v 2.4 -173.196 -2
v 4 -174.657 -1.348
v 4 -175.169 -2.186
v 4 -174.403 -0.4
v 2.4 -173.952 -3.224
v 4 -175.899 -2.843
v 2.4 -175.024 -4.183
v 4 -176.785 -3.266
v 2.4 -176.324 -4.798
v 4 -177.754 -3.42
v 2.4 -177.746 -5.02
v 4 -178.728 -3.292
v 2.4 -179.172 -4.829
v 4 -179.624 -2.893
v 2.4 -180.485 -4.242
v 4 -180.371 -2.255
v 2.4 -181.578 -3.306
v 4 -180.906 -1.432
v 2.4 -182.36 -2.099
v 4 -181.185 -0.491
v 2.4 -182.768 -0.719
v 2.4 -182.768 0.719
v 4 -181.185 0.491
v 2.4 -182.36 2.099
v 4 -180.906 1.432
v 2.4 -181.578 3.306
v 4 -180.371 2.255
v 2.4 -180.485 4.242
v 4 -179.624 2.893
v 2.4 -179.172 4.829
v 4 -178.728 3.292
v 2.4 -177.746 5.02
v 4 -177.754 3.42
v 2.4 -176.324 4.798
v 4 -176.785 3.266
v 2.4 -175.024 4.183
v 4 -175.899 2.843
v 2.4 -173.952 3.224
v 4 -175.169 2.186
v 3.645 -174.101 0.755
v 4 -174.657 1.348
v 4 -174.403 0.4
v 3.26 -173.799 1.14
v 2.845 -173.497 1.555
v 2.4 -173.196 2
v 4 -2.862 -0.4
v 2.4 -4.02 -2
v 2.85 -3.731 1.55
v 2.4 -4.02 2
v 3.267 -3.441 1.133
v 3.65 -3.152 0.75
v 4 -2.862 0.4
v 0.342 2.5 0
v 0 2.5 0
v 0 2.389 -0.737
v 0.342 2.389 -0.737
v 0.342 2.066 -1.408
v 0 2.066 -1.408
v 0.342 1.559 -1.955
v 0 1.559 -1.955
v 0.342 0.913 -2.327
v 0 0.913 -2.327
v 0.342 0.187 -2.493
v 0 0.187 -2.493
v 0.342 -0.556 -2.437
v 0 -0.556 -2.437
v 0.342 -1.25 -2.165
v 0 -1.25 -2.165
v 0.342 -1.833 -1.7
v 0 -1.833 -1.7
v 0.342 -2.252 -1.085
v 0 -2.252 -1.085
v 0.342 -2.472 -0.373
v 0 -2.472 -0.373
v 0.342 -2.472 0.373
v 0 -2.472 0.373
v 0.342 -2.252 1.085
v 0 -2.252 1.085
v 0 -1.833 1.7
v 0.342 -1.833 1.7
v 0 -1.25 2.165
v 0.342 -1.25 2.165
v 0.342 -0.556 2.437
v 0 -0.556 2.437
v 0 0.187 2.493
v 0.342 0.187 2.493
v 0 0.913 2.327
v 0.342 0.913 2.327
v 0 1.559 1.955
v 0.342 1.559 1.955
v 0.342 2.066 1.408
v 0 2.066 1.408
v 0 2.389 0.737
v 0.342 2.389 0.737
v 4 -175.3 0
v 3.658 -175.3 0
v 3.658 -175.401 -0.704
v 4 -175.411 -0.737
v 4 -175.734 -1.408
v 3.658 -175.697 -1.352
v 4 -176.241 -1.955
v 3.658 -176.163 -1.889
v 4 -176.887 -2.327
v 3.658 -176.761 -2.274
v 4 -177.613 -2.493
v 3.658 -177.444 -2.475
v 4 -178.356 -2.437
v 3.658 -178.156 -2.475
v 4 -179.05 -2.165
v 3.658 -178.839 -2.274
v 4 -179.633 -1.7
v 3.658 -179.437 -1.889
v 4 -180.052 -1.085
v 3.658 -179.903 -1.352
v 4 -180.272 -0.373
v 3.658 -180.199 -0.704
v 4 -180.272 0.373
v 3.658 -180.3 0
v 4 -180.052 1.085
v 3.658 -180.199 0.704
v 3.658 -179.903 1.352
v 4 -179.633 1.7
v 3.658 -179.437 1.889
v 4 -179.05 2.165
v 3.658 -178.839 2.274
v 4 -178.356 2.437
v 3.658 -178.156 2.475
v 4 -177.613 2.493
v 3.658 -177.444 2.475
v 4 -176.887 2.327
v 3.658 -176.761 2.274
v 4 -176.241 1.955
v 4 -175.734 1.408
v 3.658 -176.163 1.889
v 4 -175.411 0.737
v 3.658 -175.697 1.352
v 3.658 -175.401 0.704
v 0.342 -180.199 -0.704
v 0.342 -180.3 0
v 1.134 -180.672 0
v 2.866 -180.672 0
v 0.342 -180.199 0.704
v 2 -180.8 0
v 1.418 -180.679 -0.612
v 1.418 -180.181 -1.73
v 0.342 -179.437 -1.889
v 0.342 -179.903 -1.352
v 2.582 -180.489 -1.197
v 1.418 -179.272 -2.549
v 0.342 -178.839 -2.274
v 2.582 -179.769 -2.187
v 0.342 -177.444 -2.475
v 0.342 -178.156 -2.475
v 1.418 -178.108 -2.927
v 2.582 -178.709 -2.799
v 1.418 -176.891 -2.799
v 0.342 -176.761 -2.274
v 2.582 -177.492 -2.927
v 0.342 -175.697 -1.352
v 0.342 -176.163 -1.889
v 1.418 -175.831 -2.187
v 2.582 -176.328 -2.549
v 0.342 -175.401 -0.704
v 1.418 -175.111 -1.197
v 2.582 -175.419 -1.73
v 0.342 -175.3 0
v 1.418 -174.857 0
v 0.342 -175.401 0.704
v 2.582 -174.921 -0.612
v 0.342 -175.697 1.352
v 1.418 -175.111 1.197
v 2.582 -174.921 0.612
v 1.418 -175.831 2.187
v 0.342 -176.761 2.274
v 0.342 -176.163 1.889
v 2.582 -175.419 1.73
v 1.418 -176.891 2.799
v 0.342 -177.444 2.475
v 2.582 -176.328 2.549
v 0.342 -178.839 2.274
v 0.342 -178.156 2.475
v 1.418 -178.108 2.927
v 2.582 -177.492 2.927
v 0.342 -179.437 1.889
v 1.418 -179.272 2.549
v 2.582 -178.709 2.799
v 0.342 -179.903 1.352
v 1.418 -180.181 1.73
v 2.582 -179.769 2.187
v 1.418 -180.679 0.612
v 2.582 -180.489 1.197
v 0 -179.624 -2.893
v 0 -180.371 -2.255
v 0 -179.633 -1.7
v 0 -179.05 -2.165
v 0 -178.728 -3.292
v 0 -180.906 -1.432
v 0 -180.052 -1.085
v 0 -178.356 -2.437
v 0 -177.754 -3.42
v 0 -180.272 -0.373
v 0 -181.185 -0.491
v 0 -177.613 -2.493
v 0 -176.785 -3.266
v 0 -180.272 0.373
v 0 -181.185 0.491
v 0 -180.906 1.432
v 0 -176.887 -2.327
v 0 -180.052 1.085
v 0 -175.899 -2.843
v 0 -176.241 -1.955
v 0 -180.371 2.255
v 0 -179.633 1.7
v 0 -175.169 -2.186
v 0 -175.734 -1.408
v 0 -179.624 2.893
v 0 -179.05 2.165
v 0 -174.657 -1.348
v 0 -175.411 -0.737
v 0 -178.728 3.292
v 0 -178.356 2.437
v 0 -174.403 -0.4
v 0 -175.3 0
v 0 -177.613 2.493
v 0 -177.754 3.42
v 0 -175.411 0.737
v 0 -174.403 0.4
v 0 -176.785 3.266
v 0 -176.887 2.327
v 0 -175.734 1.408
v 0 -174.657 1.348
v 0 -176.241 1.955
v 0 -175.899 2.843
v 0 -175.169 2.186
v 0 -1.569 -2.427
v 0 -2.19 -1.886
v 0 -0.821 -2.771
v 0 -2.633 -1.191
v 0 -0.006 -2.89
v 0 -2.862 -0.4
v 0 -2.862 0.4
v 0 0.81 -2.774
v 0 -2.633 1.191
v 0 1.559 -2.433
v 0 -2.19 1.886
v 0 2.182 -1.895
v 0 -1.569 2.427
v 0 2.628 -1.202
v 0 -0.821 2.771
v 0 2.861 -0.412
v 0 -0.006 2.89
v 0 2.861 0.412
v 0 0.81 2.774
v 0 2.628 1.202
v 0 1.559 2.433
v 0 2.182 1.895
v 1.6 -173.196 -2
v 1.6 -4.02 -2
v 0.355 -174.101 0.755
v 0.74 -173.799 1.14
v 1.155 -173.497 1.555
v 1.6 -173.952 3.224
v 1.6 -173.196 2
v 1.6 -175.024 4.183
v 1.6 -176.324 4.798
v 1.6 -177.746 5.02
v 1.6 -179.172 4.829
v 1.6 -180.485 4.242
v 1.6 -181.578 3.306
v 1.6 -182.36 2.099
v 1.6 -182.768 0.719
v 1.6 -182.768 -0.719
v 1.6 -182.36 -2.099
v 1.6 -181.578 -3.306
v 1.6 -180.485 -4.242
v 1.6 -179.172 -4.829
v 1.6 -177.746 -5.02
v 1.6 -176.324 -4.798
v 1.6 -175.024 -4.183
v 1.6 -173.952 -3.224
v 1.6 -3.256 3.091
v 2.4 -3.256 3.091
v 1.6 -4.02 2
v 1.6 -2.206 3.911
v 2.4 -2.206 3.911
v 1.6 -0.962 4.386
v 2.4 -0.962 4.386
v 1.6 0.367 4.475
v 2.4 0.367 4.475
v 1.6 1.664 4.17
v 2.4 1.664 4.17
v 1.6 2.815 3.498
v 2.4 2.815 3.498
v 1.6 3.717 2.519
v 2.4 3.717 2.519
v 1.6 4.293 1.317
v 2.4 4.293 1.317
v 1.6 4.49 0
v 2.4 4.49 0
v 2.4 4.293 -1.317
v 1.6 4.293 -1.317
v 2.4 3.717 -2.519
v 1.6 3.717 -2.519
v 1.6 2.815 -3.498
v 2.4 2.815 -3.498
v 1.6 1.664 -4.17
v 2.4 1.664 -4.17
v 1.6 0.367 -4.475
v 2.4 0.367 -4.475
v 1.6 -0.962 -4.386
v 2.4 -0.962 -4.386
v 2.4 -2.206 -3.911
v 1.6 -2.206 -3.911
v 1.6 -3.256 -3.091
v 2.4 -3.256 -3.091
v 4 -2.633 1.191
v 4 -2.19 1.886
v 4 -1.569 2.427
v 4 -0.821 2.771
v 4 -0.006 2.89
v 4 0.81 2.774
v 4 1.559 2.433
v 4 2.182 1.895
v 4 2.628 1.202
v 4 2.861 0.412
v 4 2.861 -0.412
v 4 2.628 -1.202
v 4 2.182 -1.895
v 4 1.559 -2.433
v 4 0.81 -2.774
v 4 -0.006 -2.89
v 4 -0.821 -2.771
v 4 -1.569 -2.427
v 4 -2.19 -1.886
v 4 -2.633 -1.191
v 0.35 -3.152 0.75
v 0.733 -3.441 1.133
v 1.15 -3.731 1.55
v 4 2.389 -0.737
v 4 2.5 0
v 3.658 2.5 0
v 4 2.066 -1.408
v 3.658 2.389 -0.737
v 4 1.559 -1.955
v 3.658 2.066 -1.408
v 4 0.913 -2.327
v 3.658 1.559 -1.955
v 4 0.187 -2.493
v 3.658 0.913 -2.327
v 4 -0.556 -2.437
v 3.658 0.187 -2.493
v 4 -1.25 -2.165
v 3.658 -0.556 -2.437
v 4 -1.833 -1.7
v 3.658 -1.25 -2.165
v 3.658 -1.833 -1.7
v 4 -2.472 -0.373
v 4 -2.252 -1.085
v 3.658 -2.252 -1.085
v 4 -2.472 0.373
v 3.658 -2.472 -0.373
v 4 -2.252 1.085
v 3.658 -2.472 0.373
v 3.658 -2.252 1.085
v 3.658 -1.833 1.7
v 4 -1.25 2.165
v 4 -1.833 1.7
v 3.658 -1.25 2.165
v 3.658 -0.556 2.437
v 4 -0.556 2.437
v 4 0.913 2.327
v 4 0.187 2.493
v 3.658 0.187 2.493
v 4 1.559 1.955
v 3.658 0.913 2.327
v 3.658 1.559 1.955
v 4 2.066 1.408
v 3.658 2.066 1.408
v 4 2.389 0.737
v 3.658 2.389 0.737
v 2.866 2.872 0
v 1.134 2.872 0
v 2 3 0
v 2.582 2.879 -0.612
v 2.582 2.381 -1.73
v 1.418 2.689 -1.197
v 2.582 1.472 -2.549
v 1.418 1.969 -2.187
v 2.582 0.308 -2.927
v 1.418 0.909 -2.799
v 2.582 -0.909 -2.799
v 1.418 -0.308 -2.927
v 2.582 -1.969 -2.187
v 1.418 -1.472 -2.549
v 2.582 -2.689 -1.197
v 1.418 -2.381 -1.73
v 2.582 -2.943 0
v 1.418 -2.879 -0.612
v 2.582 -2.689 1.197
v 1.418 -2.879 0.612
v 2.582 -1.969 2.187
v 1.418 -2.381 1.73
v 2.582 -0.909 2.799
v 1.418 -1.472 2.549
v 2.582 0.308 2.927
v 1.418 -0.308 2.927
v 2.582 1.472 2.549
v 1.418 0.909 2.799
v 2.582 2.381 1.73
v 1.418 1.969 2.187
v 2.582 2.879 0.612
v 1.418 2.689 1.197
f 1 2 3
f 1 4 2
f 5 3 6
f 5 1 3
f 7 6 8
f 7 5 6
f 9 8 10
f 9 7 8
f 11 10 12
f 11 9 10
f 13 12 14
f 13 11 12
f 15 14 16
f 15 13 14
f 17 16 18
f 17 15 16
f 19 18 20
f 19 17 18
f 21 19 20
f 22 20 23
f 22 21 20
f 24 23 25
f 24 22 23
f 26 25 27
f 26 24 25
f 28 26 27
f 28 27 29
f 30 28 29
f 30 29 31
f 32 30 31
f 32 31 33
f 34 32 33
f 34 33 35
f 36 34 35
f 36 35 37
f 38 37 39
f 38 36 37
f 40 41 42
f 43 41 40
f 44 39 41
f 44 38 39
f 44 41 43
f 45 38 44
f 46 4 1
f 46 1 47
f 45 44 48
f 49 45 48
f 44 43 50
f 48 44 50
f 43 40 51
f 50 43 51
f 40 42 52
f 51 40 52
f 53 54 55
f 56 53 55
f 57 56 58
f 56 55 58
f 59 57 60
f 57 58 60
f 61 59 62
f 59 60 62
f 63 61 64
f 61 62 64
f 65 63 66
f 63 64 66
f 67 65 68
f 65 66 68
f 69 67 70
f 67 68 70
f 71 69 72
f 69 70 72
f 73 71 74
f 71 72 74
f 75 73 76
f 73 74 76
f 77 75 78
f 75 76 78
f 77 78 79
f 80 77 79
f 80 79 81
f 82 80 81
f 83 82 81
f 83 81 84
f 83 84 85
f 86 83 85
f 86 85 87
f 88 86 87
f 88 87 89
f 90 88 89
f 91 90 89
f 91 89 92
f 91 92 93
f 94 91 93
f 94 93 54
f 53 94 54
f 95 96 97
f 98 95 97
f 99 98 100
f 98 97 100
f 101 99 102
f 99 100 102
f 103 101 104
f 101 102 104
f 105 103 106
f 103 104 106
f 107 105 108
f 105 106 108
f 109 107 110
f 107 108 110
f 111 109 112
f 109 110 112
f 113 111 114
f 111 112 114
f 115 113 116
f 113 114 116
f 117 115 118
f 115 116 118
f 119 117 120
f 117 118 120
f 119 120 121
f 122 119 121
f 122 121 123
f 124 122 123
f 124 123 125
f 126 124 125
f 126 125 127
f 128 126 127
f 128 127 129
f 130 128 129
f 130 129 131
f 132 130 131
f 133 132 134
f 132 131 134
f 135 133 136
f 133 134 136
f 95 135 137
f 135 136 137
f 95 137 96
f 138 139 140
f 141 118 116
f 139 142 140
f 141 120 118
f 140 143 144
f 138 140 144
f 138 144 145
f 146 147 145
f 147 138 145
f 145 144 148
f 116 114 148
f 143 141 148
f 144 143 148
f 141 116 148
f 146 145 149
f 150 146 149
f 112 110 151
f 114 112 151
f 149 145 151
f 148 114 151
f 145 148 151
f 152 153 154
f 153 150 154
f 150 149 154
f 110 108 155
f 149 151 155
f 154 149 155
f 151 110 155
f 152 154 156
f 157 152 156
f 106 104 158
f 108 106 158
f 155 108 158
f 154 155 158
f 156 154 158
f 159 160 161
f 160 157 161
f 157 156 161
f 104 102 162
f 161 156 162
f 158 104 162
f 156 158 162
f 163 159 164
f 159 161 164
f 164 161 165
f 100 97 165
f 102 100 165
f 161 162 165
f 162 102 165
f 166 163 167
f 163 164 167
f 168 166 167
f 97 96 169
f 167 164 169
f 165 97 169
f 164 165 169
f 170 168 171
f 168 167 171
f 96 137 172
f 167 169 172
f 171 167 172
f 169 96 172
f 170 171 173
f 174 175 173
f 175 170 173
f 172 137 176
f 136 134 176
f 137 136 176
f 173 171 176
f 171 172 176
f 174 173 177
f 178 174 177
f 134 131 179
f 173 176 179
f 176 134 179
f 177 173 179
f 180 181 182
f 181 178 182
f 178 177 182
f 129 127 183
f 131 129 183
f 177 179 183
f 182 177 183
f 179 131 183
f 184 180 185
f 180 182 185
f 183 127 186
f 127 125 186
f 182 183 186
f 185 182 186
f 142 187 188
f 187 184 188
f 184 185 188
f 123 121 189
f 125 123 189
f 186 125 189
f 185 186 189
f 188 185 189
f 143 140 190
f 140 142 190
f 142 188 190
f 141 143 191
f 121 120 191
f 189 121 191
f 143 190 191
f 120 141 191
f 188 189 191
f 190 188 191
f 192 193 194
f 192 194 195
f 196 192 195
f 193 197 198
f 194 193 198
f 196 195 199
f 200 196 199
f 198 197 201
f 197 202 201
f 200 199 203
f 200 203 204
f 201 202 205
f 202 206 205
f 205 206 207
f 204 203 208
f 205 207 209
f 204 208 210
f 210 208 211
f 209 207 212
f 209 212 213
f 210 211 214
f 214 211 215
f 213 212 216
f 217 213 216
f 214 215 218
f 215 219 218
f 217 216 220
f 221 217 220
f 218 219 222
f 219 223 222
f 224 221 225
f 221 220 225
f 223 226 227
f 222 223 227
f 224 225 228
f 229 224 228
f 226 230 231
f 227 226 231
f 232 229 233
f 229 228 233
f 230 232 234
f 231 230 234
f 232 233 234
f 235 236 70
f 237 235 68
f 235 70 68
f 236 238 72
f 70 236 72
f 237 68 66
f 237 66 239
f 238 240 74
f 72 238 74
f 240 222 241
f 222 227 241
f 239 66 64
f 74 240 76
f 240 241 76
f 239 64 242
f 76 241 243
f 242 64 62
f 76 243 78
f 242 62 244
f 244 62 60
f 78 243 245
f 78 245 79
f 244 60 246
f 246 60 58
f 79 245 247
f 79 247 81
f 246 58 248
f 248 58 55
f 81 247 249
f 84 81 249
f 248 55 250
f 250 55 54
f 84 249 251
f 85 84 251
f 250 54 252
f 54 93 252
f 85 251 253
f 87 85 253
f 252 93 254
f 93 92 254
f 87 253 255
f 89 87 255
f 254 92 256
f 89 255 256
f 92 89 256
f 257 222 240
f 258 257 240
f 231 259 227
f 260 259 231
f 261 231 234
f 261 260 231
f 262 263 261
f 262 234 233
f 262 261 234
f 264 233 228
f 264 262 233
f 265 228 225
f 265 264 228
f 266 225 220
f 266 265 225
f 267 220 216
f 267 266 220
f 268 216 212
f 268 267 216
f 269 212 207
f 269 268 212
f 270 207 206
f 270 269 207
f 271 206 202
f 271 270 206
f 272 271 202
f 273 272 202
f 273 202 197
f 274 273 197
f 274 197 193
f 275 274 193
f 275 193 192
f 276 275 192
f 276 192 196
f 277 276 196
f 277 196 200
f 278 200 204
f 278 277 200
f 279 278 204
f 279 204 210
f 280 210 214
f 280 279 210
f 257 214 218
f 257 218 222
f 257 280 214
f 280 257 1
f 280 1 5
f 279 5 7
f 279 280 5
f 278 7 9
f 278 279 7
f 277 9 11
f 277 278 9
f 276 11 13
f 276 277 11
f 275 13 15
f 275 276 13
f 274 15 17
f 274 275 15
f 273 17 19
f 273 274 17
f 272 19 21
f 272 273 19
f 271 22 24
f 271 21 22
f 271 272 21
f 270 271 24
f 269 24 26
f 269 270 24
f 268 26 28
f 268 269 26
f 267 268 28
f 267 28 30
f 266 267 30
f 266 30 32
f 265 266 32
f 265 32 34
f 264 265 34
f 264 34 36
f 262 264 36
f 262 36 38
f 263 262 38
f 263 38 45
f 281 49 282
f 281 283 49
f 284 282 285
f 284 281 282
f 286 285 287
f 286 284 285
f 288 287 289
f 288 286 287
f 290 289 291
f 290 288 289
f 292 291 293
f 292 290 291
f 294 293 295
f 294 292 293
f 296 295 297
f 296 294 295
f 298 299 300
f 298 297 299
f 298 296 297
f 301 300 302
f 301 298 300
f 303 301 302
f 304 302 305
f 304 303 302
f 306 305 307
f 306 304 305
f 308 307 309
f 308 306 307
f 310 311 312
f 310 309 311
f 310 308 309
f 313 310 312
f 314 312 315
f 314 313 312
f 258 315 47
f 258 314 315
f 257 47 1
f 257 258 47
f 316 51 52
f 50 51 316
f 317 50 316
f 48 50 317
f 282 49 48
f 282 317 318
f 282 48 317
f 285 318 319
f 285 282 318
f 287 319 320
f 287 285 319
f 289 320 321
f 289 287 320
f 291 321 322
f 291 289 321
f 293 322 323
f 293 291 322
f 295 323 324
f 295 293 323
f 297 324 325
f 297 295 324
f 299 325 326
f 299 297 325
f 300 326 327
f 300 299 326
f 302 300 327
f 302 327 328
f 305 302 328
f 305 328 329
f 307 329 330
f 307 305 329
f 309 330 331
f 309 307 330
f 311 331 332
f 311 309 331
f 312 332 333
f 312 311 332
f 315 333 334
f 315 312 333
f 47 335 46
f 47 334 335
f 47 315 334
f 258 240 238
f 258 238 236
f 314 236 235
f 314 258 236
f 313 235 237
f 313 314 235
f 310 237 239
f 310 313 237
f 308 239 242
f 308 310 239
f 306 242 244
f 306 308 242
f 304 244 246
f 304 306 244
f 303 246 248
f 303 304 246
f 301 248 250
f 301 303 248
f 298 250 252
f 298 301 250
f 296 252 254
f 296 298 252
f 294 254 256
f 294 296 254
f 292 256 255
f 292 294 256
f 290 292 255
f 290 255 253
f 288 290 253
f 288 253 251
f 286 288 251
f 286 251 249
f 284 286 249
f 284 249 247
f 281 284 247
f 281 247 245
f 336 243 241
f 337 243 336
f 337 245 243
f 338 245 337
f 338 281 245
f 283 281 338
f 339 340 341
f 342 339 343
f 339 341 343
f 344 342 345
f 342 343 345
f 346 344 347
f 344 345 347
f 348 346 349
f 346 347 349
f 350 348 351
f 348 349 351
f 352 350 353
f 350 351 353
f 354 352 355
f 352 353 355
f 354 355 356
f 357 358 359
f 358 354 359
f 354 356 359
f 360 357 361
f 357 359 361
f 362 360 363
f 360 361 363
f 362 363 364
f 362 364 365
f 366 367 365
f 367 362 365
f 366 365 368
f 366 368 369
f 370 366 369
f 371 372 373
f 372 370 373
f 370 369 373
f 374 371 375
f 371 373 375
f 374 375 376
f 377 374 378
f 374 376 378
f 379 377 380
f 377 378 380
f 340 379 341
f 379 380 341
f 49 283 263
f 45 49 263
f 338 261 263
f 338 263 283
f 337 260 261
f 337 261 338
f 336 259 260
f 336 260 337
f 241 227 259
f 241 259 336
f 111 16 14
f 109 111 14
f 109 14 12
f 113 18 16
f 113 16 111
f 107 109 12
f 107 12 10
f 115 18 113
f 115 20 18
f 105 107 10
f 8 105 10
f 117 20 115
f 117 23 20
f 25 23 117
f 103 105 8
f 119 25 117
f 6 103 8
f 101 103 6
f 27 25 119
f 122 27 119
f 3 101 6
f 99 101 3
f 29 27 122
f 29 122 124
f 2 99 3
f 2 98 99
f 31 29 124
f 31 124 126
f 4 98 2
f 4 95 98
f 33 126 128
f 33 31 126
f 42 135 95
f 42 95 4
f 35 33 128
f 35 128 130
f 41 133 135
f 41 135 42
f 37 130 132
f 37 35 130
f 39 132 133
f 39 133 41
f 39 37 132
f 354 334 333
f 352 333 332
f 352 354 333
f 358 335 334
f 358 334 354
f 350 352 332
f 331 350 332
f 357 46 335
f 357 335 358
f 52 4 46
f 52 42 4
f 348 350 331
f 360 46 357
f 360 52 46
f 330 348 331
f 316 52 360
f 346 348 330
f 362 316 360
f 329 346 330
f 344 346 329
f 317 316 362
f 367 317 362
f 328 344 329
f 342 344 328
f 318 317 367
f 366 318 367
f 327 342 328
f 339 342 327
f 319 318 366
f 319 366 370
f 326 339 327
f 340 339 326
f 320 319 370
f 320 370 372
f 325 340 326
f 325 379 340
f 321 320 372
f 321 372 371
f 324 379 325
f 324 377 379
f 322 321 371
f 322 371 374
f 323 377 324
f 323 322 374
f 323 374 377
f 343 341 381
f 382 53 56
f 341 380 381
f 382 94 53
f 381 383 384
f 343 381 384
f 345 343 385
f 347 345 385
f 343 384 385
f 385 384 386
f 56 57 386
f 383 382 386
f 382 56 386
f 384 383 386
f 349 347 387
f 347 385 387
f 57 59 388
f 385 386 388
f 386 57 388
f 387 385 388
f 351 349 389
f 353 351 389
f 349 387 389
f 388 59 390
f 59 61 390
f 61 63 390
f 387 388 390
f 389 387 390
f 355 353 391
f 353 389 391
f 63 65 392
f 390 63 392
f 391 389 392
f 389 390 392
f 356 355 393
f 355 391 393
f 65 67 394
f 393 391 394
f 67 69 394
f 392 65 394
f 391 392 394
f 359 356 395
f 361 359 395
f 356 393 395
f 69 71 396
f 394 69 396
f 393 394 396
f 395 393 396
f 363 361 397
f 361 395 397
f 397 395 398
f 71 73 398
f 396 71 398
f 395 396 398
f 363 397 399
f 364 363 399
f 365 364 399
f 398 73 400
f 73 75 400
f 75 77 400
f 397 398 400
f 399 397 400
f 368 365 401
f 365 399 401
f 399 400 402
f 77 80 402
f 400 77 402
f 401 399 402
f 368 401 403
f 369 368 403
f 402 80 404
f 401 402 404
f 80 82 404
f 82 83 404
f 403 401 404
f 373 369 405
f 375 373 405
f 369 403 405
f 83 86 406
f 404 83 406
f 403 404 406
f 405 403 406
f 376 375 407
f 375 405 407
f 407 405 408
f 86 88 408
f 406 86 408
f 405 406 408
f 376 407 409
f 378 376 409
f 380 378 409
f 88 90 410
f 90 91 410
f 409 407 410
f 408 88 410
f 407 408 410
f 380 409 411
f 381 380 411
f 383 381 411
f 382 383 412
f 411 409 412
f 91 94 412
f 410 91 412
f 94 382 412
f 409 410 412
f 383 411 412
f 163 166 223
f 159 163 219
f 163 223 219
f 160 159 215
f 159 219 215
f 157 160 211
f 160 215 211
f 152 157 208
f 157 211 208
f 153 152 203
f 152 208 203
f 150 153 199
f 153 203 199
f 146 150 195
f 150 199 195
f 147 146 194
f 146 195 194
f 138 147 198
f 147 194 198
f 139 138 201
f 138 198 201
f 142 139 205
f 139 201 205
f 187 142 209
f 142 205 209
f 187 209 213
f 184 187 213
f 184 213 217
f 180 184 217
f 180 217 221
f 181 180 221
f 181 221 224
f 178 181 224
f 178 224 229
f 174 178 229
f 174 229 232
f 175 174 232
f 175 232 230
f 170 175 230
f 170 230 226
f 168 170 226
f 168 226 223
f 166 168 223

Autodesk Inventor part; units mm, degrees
ref_plane "YZ Plane" through (0, 0, 0) normal (1, 0, 0) x (0, 1, 0)
ref_plane "XZ Plane" through (0, 0, 0) normal (0, 1, 0) x (-1, 0, 0)
ref_plane "XY Plane" through (0, 0, 0) normal (0, 0, 1) x (1, 0, 0)
sketch "Sketch1" plane through (0, 0, 0) normal (1, 0, 0) x (0, 1, 0)
  circle A0 centre (0, 0) radius 2.5
  arc A1 (-4.0201, -2) -> (-4.0201, 2) centre (0, 0) ccw
  line L0 (0, 0) -> (-177.8, 0) construction
  circle A2 centre (-177.8, 0) radius 2.5
  arc A3 (-173.1955, 2) -> (-173.1955, -2) centre (-177.8, 0) ccw
  line L1 (-4.0201, 2) -> (-173.1955, 2)
  line L2 (-4.0201, -2) -> (-173.1955, -2)
  dimension "d0" = 5
  dimension "d1" = 1.9901
  dimension "d2" = 177.8
  dimension "d3" = 5
  dimension "d4" = 2.5201
  dimension "d9" = 4
  dimension "d10" = 2
extrude "Extrusion1" add sketch "Sketch1" along normal blind 4
chamfer "Chamfer1" distance 1.6 angle 45 8 edges at (4, -88.6078, 2) (0, -88.6078, 2) (0, -88.6078, -2) (4, -88.6078, -2) (0, 4.4901, 0) (4, 4.4901, 0) (0, -182.8201, 0) (4, -182.8201, 0)
sketch "Sketch2" plane through (0, 0, 0) normal (0, 0, 1) x (1, 0, 0)
  line L0 (4, 2.5) -> (4, -2.5) projected
  line L1 (0, 2.5) -> (0, -2.5) projected
  line L2 (4, -175.3) -> (4, -180.3) projected
  line L3 (0, -175.3) -> (0, -180.3) projected
  line L4 (4, 2.5) -> (4, -2.5) construction
  line L5 (4, 0) -> (0, 0)
  line L6 (0, 2.5) -> (0, -2.5) construction
  line L7 (0, -175.3) -> (0, -180.3) construction
  line L8 (0, -177.8) -> (4, -177.8) construction
  line L9 (4, -175.3) -> (4, -180.3) construction
  circle A0 centre (2, 0) radius 3
  circle A1 centre (2, -177.8) radius 3
  line L10 (-1, -177.8) -> (5, -177.8)
  line L11 (5, 0) -> (-1, 0)
  dimension "d14" = 6
  dimension "d15" = 6
revolve "Revolution1" cut sketch "Sketch2" angle 360 about axis through (-1, -177.8, 0) along (1, 0, 0) picked at (4.1409, -179.1351) picked at (2, -178.8) picked at (-0.1409, -179.1351) contours L10 A1 L2 | L2 A1 L3 L10 | L3 A1 L10
sketch "Sketch3" plane through (0, 0, 0) normal (0, 0, 1) x (1, 0, 0)
  line L0 (4, 2.5) -> (4, -2.5)
  line L1 (0, 2.5) -> (0, -2.5)
  line L2 (4, -175.3) -> (4, -180.3)
  line L3 (0, -175.3) -> (0, -180.3)
  line L4 (4, 2.5) -> (4, -2.5) construction
  line L5 (4, 0) -> (0, 0)
  line L6 (0, 2.5) -> (0, -2.5) construction
  line L7 (0, -175.3) -> (0, -180.3) construction
  line L8 (0, -177.8) -> (4, -177.8) construction
  line L9 (4, -175.3) -> (4, -180.3) construction
  circle A0 centre (2, 0) radius 3
  circle A1 centre (2, -177.8) radius 3
  line L10 (-1, -177.8) -> (5, -177.8)
  line L11 (5, 0) -> (-1, 0)
  dimension "d17" = 6
  dimension "d18" = 6
revolve "Revolution2" cut sketch "Sketch3" angle 360 about axis through (5, 0, 0) along (-1, 0, 0) picked at (4.1409, 1.3351) picked at (2, 1) picked at (-0.1409, 1.3351) contours A0 L11 L0 | L0 L5 L1 A0 | L1 L11 A0
properties part number "Delta Robot Arm Segment Two"
